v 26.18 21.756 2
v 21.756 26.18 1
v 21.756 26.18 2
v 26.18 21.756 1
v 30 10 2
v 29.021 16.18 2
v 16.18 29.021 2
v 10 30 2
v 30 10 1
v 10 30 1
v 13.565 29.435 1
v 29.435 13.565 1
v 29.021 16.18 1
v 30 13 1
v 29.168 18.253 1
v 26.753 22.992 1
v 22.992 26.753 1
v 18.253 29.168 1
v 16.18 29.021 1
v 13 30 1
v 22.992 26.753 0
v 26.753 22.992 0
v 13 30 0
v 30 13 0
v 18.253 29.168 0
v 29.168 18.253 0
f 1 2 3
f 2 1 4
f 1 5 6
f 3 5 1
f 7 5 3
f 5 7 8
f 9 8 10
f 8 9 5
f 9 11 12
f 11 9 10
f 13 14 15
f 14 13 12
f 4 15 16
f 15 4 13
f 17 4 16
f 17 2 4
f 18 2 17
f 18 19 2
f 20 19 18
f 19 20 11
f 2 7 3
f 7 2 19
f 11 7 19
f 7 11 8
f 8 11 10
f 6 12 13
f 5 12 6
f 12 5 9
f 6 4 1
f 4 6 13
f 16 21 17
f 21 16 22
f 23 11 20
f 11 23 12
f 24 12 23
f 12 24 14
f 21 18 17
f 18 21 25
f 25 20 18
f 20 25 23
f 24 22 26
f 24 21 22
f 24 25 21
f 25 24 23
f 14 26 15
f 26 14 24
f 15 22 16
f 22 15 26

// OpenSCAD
//debug "missing segment issue"
// sometimes there are less segments than calculated when $fn is divisible by 4
// -- findings
// - combinations of certain radii with certain $fn
// - push_arc alone shows issue
// - independen from start and and parameters
$fn=20;

//Test-Parameters
dbgFacets();
module dbgFacets(){
  /*
  body(topDims=[boxTopDims.x-wallThck*2,boxTopDims.y-wallThck*2],
            lwrDims=flrDims,
            height=boxDims.z-footDims.z-wallThck+fudge,
            crnrRad=boxCrnrRad-wallThck);
  */
  // findings
  // combinations of certain radii with certain $fn
  
  goodRad=20;
  badRad=17;
  dims= [60,60];
  
  color("red") translate([0,0,1]) linear_extrude(1) 
    push_arc_Dbg(start=[dims.x/2-goodRad,dims.y/2],
                  end=[dims.x/2,dims.y/2-goodRad],
                  r=goodRad);
  color("green")  linear_extrude(1) 
    push_arc_Dbg(start=[dims.x/2-badRad,dims.y/2],
                  end=[dims.x/2,dims.y/2-badRad],
                  r=badRad);
}


module push_arc_Dbg(start, end, r, sweep=1, poly=[], iter=0){
  chord = norm(start-end);
  r = (r<chord/2) ? chord/2 : r; //limit the radius to half the chord length, doesn't work
  cc = c_centers(start,end,r);
  center=cc[sweep];
  dir = sweep ? -1 : 1;
  //calulate start and end angle with atan2 to address all quadrants
  sa = atan2(start.y-center.y,start.x-center.x); //atan2(y/x) 
  ea = atan2(end.y-center.y,end.x-center.x); //atan2(y/x) 
  u= center-start;
  v= center-end;
  angle = acos(u * v / (norm(u)*norm(v)));
  //facets= arcFragments(r,abs(angle)); //total facets
  facets= floor($fn/(360/round(angle)))+1; //total facets
  echo(str("facets: ",facets,", radius: ", r, ", angle: ", angle,", $fn: ", $fn));
  echo (angle==90?true:false);
  angInc=(dir*angle)/(facets-1);
  x = center.x+r*cos(sa+angInc*iter);
  y = center.y+r*sin(sa+angInc*iter);
  if (iter<facets) 
    push_arc_Dbg(start,end,r, sweep, poly=concat(poly,[[x,y]]),iter=iter+1);
  else
    polygon(poly);
}

//calculate two centers from two points and a radius (when 3rd Point is missing there are two solutions)
//from https://lydxlx1.github.io/blog/2020/05/16/circle-passing-2-pts-with-fixed-r/
function c_centers(P1, P2, r)= let(
  q = sqrt(pow((P2.x-P1.x),2) + pow((P2.y-P1.y),2)),
  x3 = (P1.x + P2.x) /2,
  y3 = (P1.y + P2.y) /2,
  xx = sqrt(pow(r,2) - pow(q/2,2))*(P1.y-P2.y)/q,
  yy = sqrt(pow(r,2) - pow(q/2,2))*(P2.x-P1.x)/q
) [[x3 + xx, y3+yy], [x3-xx,y3-yy]];


// OpenSCAD loft module, with n layers.

module loft(upper_points, lower_points, number_of_layers){
  echo(len(upper_points),len(lower_points));
  assert(len(upper_points)==len(lower_points),"[loft] upper and lower must be equal in length");
  
  polyhedron( 
      points = [
          for (i = [0 : number_of_layers])
              for (j = [0 : len(upper_points) - 1])
                  [((upper_points[j][0] * (number_of_layers - i) / number_of_layers)
                  + (lower_points[j][0] * i / number_of_layers)), //X
                  ((upper_points[j][1] * (number_of_layers - i) / number_of_layers)
                  + (lower_points[j][1] * i / number_of_layers)), //Y
                  ((upper_points[j][2] * (number_of_layers - i) / number_of_layers)
                  + (lower_points[j][2] * i / number_of_layers))] //Z
      ],
      faces = [
          [for (i= [0 : len(upper_points)-1]) i], // Upper plane.
          for (i = [0 : number_of_layers -1])
              for (j = [0 : len(upper_points) - 1]) // Towards lower points.
                  [len(upper_points) * i + (j+1)%len(upper_points), 
                  len(upper_points) * i + j, 
                  len(upper_points) * (i+1) + j],
          for (i = [1 : number_of_layers])
              for (j = [0 : len(upper_points) - 1]) // Towards upper points.
                  [len(upper_points) * i + j, 
                  len(upper_points) * i + (j+1) % len(upper_points), 
                  len(upper_points) * (i-1) + (j+1) % len(upper_points)],
          [for (i= [len(upper_points) * (number_of_layers+1) -1  : -1 : len(upper_points) * number_of_layers ]) i], // Lower plane.
      ]
  );
}
